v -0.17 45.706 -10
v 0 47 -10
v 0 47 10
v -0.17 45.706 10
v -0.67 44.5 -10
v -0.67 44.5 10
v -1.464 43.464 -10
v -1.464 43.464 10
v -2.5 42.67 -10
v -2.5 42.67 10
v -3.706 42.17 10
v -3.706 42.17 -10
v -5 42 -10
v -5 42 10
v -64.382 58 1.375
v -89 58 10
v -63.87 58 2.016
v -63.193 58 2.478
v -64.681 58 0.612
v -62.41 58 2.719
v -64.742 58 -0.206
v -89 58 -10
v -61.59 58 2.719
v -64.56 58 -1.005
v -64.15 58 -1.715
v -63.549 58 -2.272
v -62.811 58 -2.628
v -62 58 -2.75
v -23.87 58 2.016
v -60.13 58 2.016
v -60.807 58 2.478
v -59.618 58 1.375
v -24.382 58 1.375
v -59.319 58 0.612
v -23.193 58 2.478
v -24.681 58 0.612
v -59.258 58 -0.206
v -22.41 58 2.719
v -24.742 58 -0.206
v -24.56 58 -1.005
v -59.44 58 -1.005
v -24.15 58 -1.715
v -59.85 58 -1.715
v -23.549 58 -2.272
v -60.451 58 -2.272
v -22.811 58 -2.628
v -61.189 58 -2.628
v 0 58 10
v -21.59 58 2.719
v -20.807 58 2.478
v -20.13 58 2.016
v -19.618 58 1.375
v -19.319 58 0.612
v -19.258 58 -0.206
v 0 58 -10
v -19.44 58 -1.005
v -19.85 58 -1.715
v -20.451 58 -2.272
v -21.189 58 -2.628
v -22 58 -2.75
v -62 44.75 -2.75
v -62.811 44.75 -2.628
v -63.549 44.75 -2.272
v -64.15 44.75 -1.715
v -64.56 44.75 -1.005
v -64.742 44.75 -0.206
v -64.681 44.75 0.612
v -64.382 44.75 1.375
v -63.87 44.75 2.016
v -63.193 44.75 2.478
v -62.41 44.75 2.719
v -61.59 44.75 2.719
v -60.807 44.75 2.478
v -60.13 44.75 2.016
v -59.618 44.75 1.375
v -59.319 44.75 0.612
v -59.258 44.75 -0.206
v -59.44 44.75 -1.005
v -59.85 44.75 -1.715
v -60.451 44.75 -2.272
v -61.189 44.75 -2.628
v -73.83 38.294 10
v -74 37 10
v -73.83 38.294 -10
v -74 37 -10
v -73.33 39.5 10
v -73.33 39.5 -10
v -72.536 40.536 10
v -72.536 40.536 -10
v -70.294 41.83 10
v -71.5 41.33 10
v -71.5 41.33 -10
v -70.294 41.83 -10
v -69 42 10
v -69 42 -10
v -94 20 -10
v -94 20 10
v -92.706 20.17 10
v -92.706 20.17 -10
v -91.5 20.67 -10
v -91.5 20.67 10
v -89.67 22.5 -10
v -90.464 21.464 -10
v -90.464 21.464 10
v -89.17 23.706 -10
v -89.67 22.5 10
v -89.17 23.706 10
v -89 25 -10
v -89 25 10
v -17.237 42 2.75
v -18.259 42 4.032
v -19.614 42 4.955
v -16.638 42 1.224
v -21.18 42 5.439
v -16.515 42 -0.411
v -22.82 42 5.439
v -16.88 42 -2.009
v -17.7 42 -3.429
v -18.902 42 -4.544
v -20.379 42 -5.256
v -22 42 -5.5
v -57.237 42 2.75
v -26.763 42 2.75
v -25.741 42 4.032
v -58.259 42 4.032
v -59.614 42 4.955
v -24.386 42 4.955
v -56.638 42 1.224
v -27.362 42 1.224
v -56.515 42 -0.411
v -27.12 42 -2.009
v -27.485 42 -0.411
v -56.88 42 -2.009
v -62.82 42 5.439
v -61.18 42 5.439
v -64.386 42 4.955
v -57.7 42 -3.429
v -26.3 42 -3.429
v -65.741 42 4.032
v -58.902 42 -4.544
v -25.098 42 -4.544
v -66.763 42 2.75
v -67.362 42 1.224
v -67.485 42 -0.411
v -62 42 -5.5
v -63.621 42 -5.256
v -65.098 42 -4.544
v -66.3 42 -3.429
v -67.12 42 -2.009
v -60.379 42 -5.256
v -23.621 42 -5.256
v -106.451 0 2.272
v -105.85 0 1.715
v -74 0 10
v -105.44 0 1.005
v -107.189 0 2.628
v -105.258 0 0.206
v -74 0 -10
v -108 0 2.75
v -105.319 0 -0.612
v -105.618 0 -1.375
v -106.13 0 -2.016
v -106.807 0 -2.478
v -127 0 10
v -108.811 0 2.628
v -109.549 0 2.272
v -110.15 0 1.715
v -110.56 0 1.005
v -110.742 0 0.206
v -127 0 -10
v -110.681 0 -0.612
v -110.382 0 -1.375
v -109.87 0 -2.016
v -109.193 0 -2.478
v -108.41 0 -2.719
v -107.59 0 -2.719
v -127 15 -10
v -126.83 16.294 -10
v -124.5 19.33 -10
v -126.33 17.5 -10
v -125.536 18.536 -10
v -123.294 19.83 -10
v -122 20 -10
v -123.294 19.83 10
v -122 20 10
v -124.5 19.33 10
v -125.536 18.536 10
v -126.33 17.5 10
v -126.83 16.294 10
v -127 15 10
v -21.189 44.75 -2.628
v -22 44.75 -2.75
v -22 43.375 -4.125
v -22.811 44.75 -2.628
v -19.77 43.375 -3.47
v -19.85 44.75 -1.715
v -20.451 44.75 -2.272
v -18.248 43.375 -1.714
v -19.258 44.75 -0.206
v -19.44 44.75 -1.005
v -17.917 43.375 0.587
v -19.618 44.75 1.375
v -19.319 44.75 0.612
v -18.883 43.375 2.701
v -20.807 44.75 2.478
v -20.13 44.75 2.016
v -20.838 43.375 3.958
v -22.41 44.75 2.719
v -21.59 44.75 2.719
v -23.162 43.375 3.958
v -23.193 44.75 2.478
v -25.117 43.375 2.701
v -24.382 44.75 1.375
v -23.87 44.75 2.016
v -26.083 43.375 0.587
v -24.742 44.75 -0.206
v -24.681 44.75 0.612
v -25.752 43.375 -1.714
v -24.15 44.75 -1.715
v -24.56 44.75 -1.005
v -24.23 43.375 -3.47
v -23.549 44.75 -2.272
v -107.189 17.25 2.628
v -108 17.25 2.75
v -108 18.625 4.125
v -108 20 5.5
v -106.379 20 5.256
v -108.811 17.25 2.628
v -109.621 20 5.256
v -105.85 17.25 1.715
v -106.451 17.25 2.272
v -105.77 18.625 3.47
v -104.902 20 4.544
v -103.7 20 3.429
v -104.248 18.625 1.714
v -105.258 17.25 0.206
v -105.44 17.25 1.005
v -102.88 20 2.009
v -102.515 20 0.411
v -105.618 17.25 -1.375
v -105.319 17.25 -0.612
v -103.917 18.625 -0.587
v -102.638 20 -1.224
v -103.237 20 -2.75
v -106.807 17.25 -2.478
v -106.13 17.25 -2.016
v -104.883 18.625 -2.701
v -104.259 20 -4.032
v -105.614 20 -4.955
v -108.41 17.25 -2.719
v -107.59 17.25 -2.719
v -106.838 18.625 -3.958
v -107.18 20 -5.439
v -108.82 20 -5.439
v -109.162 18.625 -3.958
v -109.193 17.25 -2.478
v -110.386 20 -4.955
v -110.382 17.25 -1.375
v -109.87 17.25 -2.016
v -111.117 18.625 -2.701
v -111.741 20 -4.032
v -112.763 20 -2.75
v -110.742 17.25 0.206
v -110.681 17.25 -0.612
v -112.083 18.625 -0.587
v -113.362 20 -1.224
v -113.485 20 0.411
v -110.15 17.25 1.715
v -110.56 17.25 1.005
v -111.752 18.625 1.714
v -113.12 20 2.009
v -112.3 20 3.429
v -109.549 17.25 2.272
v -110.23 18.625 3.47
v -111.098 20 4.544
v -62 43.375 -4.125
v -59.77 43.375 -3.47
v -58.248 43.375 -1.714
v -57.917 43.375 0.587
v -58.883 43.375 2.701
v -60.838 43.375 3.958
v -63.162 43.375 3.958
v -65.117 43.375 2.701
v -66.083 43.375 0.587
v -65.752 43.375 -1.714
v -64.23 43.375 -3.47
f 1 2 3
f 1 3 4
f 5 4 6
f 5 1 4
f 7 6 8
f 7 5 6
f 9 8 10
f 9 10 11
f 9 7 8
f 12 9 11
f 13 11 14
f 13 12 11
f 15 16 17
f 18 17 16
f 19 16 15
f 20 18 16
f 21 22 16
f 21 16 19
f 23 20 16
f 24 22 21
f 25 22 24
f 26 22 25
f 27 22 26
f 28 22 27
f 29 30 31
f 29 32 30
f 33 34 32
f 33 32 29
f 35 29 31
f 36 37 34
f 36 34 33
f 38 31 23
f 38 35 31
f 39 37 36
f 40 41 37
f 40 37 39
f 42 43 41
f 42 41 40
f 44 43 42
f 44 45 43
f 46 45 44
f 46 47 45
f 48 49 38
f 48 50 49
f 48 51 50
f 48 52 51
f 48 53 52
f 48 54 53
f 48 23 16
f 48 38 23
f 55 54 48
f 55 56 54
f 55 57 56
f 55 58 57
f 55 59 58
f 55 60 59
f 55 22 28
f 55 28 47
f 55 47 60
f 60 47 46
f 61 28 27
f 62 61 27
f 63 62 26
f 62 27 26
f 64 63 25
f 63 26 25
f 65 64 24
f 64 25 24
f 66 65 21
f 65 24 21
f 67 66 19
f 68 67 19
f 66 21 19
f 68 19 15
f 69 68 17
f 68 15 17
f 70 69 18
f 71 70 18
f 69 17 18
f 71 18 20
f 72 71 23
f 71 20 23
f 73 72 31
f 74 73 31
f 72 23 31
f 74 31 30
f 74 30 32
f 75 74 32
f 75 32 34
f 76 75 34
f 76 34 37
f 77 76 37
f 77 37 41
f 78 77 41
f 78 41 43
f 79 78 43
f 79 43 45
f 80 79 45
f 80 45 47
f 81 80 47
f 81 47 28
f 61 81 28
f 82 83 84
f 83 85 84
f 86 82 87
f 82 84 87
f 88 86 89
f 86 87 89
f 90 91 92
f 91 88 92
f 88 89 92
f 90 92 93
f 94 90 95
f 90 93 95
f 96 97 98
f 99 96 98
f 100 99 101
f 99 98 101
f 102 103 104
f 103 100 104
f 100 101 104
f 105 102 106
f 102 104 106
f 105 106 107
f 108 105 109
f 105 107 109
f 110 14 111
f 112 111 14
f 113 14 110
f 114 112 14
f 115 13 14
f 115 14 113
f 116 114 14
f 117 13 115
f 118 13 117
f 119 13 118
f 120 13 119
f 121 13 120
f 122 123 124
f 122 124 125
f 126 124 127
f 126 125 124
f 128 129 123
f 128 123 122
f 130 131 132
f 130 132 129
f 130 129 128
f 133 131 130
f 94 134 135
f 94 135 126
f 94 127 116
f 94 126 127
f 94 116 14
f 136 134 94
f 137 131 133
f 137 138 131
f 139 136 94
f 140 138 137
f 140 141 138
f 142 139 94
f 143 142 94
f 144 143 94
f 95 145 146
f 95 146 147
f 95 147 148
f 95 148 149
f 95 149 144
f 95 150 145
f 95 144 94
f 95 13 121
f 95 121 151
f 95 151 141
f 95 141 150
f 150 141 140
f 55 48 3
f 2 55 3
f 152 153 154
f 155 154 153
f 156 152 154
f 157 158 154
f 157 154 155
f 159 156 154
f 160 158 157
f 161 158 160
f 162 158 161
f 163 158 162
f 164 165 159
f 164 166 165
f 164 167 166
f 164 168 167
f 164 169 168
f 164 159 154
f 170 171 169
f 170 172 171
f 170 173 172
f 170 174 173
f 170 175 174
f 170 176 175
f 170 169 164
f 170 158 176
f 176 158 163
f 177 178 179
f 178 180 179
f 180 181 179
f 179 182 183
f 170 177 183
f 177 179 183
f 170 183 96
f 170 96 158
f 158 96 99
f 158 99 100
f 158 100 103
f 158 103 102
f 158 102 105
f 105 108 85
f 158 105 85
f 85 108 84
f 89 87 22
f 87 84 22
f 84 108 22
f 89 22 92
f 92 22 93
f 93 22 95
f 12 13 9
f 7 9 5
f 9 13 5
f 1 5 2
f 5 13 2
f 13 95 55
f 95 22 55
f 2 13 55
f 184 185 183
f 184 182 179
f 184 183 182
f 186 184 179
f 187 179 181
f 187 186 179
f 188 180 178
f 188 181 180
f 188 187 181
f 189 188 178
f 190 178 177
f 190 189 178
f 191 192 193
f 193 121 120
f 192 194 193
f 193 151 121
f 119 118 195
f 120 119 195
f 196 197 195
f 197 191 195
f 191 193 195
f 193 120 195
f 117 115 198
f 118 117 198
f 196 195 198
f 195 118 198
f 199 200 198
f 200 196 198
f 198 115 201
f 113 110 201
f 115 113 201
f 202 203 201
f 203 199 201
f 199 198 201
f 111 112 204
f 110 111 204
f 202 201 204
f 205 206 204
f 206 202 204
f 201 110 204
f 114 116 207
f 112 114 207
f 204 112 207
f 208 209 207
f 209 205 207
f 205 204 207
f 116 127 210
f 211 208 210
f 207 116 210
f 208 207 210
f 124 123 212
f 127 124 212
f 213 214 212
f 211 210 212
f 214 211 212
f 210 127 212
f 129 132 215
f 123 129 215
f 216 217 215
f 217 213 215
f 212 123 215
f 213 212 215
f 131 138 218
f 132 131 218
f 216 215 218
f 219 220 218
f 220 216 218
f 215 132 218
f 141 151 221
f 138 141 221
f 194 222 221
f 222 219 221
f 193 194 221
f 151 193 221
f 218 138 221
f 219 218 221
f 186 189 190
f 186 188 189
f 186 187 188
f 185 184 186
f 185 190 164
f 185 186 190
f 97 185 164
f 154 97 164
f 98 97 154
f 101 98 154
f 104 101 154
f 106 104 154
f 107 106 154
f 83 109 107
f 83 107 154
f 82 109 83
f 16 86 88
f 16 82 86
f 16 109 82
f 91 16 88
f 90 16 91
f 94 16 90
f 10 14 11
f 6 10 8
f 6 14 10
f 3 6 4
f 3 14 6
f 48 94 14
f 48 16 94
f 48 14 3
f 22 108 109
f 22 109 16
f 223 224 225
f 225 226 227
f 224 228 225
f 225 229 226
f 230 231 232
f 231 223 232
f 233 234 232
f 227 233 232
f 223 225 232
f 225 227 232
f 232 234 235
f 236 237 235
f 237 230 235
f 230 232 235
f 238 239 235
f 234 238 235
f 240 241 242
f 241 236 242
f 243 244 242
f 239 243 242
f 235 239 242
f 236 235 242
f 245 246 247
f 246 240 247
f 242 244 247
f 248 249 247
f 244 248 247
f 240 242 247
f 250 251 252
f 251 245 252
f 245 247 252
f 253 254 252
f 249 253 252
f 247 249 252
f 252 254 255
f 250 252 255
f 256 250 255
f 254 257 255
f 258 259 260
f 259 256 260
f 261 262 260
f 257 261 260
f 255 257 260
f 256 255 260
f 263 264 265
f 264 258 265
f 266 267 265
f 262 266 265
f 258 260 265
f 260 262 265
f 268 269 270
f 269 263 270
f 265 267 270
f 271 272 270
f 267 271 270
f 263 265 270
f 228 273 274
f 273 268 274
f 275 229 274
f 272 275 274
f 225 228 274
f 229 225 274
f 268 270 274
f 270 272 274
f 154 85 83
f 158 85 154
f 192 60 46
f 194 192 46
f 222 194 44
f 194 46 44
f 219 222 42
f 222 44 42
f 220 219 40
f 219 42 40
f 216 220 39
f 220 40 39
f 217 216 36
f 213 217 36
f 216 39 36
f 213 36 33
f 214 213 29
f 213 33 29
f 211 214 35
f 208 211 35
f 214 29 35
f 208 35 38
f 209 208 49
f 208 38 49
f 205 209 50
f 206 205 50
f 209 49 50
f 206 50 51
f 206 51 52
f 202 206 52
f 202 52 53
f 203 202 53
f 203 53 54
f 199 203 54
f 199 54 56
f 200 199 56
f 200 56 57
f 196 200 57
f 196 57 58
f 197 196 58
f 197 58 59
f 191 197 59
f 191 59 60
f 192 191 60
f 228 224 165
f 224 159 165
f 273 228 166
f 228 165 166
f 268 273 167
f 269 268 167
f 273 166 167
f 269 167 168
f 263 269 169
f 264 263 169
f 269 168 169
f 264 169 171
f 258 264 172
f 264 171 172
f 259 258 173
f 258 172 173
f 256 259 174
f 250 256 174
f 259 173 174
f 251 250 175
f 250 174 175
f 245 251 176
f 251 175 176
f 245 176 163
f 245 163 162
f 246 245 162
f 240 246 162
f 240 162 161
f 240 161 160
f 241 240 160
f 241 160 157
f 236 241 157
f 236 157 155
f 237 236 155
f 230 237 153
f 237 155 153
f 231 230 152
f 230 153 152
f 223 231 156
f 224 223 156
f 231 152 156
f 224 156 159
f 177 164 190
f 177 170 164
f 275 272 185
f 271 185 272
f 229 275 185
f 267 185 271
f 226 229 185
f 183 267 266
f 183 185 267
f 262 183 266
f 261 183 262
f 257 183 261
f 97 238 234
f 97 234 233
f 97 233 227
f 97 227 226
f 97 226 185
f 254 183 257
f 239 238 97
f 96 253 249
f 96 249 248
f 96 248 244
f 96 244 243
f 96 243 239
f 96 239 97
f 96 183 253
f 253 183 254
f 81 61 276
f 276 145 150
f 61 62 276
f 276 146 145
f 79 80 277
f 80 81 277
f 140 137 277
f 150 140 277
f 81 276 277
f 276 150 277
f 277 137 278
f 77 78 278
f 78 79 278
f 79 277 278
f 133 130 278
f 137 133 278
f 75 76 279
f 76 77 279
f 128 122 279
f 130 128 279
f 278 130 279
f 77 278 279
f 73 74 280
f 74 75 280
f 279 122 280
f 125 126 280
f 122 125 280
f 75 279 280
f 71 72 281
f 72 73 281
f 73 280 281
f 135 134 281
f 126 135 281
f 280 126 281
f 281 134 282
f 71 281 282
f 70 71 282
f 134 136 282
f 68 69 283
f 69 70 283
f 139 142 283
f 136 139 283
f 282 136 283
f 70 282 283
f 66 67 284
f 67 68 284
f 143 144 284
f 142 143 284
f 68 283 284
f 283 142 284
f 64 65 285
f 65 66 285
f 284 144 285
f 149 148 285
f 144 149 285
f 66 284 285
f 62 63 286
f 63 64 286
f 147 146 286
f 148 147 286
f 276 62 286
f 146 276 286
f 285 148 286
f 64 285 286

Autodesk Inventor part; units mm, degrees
ref_plane "YZ Plane" through (0, 0, 0) normal (1, 0, 0) x (0, 1, 0)
ref_plane "XZ Plane" through (0, 0, 0) normal (0, 1, 0) x (-1, 0, 0)
ref_plane "XY Plane" through (0, 0, 0) normal (0, 0, 1) x (1, 0, 0)
sketch "Sketch1" plane through (0, 0, 0) normal (0, 0, 1) x (1, 0, 0)
  line L0 (-89, 58) -> (0, 58)
  line L1 (0, 42) -> (-74, 42)
  line L2 (-74, 42) -> (-74, 0)
  line L3 (-74, 0) -> (-127, 0)
  line L4 (-127, 0) -> (-127, 20)
  line L5 (-127, 20) -> (-89, 20)
  line L6 (-89, 20) -> (-89, 58)
  line L7 (0, 58) -> (0, 42)
  point P0 (0, 0)
  point P1 (0, 50)
  point P2 (-100.5, 0)
  dimension "d116" = 15
  dimension "d128" = 89
  dimension "d129" = 16
  dimension "d130" = 20
  dimension "d131" = 53
  dimension "d132" = 38
  dimension "d135" = 74
extrude "Soporte" add sketch "Sketch1" along normal mid plane 20
sketch "Sketch13" plane through (-74, 42, 10) normal (0, 1, 0) x (1, 0, 0)
  line L0 (12, 10) -> (52, 10) construction
  line L1 (0, 20) -> (0, 0) projected
  line L2 (0, 0) -> (74, 0) projected
  point P0 (74, 10)
  point P1 (32, 10)
  point P2 (-15, 20)
  point P3 (74, 20)
  point P4 (0, 10)
  dimension "d104" = 40
  dimension "d133" = 32
hole "BCA M5" at (-62, 42, 0) at (-22, 42, 0) direction (0, 1, 0) diameter 5.5 end through all countersink diameter 11 countersink angle 90
fillet "Fillet7" radius 5 4 edges at (-89, 20, 0) (-74, 42, 0) (-127, 20, 0) (0, 42, 0)
sketch "Sketch15" plane through (-122, 20, 10) normal (0, 1, 0) x (1, 0, 0)
  line L0 (28, 0) -> (0, 0) projected
  line L1 (0, 0) -> (0, 20) projected
  point P0 (122, 10)
  point P1 (14, 10)
  point P2 (14, 0)
  point P3 (0, 10)
hole "Hole8" at (-108, 20, 0) direction (0, -1, 0) diameter 5.5 end through all countersink diameter 11 countersink angle 90
properties part number "unión placa soporte TIC DC" material "PET Plastic"
